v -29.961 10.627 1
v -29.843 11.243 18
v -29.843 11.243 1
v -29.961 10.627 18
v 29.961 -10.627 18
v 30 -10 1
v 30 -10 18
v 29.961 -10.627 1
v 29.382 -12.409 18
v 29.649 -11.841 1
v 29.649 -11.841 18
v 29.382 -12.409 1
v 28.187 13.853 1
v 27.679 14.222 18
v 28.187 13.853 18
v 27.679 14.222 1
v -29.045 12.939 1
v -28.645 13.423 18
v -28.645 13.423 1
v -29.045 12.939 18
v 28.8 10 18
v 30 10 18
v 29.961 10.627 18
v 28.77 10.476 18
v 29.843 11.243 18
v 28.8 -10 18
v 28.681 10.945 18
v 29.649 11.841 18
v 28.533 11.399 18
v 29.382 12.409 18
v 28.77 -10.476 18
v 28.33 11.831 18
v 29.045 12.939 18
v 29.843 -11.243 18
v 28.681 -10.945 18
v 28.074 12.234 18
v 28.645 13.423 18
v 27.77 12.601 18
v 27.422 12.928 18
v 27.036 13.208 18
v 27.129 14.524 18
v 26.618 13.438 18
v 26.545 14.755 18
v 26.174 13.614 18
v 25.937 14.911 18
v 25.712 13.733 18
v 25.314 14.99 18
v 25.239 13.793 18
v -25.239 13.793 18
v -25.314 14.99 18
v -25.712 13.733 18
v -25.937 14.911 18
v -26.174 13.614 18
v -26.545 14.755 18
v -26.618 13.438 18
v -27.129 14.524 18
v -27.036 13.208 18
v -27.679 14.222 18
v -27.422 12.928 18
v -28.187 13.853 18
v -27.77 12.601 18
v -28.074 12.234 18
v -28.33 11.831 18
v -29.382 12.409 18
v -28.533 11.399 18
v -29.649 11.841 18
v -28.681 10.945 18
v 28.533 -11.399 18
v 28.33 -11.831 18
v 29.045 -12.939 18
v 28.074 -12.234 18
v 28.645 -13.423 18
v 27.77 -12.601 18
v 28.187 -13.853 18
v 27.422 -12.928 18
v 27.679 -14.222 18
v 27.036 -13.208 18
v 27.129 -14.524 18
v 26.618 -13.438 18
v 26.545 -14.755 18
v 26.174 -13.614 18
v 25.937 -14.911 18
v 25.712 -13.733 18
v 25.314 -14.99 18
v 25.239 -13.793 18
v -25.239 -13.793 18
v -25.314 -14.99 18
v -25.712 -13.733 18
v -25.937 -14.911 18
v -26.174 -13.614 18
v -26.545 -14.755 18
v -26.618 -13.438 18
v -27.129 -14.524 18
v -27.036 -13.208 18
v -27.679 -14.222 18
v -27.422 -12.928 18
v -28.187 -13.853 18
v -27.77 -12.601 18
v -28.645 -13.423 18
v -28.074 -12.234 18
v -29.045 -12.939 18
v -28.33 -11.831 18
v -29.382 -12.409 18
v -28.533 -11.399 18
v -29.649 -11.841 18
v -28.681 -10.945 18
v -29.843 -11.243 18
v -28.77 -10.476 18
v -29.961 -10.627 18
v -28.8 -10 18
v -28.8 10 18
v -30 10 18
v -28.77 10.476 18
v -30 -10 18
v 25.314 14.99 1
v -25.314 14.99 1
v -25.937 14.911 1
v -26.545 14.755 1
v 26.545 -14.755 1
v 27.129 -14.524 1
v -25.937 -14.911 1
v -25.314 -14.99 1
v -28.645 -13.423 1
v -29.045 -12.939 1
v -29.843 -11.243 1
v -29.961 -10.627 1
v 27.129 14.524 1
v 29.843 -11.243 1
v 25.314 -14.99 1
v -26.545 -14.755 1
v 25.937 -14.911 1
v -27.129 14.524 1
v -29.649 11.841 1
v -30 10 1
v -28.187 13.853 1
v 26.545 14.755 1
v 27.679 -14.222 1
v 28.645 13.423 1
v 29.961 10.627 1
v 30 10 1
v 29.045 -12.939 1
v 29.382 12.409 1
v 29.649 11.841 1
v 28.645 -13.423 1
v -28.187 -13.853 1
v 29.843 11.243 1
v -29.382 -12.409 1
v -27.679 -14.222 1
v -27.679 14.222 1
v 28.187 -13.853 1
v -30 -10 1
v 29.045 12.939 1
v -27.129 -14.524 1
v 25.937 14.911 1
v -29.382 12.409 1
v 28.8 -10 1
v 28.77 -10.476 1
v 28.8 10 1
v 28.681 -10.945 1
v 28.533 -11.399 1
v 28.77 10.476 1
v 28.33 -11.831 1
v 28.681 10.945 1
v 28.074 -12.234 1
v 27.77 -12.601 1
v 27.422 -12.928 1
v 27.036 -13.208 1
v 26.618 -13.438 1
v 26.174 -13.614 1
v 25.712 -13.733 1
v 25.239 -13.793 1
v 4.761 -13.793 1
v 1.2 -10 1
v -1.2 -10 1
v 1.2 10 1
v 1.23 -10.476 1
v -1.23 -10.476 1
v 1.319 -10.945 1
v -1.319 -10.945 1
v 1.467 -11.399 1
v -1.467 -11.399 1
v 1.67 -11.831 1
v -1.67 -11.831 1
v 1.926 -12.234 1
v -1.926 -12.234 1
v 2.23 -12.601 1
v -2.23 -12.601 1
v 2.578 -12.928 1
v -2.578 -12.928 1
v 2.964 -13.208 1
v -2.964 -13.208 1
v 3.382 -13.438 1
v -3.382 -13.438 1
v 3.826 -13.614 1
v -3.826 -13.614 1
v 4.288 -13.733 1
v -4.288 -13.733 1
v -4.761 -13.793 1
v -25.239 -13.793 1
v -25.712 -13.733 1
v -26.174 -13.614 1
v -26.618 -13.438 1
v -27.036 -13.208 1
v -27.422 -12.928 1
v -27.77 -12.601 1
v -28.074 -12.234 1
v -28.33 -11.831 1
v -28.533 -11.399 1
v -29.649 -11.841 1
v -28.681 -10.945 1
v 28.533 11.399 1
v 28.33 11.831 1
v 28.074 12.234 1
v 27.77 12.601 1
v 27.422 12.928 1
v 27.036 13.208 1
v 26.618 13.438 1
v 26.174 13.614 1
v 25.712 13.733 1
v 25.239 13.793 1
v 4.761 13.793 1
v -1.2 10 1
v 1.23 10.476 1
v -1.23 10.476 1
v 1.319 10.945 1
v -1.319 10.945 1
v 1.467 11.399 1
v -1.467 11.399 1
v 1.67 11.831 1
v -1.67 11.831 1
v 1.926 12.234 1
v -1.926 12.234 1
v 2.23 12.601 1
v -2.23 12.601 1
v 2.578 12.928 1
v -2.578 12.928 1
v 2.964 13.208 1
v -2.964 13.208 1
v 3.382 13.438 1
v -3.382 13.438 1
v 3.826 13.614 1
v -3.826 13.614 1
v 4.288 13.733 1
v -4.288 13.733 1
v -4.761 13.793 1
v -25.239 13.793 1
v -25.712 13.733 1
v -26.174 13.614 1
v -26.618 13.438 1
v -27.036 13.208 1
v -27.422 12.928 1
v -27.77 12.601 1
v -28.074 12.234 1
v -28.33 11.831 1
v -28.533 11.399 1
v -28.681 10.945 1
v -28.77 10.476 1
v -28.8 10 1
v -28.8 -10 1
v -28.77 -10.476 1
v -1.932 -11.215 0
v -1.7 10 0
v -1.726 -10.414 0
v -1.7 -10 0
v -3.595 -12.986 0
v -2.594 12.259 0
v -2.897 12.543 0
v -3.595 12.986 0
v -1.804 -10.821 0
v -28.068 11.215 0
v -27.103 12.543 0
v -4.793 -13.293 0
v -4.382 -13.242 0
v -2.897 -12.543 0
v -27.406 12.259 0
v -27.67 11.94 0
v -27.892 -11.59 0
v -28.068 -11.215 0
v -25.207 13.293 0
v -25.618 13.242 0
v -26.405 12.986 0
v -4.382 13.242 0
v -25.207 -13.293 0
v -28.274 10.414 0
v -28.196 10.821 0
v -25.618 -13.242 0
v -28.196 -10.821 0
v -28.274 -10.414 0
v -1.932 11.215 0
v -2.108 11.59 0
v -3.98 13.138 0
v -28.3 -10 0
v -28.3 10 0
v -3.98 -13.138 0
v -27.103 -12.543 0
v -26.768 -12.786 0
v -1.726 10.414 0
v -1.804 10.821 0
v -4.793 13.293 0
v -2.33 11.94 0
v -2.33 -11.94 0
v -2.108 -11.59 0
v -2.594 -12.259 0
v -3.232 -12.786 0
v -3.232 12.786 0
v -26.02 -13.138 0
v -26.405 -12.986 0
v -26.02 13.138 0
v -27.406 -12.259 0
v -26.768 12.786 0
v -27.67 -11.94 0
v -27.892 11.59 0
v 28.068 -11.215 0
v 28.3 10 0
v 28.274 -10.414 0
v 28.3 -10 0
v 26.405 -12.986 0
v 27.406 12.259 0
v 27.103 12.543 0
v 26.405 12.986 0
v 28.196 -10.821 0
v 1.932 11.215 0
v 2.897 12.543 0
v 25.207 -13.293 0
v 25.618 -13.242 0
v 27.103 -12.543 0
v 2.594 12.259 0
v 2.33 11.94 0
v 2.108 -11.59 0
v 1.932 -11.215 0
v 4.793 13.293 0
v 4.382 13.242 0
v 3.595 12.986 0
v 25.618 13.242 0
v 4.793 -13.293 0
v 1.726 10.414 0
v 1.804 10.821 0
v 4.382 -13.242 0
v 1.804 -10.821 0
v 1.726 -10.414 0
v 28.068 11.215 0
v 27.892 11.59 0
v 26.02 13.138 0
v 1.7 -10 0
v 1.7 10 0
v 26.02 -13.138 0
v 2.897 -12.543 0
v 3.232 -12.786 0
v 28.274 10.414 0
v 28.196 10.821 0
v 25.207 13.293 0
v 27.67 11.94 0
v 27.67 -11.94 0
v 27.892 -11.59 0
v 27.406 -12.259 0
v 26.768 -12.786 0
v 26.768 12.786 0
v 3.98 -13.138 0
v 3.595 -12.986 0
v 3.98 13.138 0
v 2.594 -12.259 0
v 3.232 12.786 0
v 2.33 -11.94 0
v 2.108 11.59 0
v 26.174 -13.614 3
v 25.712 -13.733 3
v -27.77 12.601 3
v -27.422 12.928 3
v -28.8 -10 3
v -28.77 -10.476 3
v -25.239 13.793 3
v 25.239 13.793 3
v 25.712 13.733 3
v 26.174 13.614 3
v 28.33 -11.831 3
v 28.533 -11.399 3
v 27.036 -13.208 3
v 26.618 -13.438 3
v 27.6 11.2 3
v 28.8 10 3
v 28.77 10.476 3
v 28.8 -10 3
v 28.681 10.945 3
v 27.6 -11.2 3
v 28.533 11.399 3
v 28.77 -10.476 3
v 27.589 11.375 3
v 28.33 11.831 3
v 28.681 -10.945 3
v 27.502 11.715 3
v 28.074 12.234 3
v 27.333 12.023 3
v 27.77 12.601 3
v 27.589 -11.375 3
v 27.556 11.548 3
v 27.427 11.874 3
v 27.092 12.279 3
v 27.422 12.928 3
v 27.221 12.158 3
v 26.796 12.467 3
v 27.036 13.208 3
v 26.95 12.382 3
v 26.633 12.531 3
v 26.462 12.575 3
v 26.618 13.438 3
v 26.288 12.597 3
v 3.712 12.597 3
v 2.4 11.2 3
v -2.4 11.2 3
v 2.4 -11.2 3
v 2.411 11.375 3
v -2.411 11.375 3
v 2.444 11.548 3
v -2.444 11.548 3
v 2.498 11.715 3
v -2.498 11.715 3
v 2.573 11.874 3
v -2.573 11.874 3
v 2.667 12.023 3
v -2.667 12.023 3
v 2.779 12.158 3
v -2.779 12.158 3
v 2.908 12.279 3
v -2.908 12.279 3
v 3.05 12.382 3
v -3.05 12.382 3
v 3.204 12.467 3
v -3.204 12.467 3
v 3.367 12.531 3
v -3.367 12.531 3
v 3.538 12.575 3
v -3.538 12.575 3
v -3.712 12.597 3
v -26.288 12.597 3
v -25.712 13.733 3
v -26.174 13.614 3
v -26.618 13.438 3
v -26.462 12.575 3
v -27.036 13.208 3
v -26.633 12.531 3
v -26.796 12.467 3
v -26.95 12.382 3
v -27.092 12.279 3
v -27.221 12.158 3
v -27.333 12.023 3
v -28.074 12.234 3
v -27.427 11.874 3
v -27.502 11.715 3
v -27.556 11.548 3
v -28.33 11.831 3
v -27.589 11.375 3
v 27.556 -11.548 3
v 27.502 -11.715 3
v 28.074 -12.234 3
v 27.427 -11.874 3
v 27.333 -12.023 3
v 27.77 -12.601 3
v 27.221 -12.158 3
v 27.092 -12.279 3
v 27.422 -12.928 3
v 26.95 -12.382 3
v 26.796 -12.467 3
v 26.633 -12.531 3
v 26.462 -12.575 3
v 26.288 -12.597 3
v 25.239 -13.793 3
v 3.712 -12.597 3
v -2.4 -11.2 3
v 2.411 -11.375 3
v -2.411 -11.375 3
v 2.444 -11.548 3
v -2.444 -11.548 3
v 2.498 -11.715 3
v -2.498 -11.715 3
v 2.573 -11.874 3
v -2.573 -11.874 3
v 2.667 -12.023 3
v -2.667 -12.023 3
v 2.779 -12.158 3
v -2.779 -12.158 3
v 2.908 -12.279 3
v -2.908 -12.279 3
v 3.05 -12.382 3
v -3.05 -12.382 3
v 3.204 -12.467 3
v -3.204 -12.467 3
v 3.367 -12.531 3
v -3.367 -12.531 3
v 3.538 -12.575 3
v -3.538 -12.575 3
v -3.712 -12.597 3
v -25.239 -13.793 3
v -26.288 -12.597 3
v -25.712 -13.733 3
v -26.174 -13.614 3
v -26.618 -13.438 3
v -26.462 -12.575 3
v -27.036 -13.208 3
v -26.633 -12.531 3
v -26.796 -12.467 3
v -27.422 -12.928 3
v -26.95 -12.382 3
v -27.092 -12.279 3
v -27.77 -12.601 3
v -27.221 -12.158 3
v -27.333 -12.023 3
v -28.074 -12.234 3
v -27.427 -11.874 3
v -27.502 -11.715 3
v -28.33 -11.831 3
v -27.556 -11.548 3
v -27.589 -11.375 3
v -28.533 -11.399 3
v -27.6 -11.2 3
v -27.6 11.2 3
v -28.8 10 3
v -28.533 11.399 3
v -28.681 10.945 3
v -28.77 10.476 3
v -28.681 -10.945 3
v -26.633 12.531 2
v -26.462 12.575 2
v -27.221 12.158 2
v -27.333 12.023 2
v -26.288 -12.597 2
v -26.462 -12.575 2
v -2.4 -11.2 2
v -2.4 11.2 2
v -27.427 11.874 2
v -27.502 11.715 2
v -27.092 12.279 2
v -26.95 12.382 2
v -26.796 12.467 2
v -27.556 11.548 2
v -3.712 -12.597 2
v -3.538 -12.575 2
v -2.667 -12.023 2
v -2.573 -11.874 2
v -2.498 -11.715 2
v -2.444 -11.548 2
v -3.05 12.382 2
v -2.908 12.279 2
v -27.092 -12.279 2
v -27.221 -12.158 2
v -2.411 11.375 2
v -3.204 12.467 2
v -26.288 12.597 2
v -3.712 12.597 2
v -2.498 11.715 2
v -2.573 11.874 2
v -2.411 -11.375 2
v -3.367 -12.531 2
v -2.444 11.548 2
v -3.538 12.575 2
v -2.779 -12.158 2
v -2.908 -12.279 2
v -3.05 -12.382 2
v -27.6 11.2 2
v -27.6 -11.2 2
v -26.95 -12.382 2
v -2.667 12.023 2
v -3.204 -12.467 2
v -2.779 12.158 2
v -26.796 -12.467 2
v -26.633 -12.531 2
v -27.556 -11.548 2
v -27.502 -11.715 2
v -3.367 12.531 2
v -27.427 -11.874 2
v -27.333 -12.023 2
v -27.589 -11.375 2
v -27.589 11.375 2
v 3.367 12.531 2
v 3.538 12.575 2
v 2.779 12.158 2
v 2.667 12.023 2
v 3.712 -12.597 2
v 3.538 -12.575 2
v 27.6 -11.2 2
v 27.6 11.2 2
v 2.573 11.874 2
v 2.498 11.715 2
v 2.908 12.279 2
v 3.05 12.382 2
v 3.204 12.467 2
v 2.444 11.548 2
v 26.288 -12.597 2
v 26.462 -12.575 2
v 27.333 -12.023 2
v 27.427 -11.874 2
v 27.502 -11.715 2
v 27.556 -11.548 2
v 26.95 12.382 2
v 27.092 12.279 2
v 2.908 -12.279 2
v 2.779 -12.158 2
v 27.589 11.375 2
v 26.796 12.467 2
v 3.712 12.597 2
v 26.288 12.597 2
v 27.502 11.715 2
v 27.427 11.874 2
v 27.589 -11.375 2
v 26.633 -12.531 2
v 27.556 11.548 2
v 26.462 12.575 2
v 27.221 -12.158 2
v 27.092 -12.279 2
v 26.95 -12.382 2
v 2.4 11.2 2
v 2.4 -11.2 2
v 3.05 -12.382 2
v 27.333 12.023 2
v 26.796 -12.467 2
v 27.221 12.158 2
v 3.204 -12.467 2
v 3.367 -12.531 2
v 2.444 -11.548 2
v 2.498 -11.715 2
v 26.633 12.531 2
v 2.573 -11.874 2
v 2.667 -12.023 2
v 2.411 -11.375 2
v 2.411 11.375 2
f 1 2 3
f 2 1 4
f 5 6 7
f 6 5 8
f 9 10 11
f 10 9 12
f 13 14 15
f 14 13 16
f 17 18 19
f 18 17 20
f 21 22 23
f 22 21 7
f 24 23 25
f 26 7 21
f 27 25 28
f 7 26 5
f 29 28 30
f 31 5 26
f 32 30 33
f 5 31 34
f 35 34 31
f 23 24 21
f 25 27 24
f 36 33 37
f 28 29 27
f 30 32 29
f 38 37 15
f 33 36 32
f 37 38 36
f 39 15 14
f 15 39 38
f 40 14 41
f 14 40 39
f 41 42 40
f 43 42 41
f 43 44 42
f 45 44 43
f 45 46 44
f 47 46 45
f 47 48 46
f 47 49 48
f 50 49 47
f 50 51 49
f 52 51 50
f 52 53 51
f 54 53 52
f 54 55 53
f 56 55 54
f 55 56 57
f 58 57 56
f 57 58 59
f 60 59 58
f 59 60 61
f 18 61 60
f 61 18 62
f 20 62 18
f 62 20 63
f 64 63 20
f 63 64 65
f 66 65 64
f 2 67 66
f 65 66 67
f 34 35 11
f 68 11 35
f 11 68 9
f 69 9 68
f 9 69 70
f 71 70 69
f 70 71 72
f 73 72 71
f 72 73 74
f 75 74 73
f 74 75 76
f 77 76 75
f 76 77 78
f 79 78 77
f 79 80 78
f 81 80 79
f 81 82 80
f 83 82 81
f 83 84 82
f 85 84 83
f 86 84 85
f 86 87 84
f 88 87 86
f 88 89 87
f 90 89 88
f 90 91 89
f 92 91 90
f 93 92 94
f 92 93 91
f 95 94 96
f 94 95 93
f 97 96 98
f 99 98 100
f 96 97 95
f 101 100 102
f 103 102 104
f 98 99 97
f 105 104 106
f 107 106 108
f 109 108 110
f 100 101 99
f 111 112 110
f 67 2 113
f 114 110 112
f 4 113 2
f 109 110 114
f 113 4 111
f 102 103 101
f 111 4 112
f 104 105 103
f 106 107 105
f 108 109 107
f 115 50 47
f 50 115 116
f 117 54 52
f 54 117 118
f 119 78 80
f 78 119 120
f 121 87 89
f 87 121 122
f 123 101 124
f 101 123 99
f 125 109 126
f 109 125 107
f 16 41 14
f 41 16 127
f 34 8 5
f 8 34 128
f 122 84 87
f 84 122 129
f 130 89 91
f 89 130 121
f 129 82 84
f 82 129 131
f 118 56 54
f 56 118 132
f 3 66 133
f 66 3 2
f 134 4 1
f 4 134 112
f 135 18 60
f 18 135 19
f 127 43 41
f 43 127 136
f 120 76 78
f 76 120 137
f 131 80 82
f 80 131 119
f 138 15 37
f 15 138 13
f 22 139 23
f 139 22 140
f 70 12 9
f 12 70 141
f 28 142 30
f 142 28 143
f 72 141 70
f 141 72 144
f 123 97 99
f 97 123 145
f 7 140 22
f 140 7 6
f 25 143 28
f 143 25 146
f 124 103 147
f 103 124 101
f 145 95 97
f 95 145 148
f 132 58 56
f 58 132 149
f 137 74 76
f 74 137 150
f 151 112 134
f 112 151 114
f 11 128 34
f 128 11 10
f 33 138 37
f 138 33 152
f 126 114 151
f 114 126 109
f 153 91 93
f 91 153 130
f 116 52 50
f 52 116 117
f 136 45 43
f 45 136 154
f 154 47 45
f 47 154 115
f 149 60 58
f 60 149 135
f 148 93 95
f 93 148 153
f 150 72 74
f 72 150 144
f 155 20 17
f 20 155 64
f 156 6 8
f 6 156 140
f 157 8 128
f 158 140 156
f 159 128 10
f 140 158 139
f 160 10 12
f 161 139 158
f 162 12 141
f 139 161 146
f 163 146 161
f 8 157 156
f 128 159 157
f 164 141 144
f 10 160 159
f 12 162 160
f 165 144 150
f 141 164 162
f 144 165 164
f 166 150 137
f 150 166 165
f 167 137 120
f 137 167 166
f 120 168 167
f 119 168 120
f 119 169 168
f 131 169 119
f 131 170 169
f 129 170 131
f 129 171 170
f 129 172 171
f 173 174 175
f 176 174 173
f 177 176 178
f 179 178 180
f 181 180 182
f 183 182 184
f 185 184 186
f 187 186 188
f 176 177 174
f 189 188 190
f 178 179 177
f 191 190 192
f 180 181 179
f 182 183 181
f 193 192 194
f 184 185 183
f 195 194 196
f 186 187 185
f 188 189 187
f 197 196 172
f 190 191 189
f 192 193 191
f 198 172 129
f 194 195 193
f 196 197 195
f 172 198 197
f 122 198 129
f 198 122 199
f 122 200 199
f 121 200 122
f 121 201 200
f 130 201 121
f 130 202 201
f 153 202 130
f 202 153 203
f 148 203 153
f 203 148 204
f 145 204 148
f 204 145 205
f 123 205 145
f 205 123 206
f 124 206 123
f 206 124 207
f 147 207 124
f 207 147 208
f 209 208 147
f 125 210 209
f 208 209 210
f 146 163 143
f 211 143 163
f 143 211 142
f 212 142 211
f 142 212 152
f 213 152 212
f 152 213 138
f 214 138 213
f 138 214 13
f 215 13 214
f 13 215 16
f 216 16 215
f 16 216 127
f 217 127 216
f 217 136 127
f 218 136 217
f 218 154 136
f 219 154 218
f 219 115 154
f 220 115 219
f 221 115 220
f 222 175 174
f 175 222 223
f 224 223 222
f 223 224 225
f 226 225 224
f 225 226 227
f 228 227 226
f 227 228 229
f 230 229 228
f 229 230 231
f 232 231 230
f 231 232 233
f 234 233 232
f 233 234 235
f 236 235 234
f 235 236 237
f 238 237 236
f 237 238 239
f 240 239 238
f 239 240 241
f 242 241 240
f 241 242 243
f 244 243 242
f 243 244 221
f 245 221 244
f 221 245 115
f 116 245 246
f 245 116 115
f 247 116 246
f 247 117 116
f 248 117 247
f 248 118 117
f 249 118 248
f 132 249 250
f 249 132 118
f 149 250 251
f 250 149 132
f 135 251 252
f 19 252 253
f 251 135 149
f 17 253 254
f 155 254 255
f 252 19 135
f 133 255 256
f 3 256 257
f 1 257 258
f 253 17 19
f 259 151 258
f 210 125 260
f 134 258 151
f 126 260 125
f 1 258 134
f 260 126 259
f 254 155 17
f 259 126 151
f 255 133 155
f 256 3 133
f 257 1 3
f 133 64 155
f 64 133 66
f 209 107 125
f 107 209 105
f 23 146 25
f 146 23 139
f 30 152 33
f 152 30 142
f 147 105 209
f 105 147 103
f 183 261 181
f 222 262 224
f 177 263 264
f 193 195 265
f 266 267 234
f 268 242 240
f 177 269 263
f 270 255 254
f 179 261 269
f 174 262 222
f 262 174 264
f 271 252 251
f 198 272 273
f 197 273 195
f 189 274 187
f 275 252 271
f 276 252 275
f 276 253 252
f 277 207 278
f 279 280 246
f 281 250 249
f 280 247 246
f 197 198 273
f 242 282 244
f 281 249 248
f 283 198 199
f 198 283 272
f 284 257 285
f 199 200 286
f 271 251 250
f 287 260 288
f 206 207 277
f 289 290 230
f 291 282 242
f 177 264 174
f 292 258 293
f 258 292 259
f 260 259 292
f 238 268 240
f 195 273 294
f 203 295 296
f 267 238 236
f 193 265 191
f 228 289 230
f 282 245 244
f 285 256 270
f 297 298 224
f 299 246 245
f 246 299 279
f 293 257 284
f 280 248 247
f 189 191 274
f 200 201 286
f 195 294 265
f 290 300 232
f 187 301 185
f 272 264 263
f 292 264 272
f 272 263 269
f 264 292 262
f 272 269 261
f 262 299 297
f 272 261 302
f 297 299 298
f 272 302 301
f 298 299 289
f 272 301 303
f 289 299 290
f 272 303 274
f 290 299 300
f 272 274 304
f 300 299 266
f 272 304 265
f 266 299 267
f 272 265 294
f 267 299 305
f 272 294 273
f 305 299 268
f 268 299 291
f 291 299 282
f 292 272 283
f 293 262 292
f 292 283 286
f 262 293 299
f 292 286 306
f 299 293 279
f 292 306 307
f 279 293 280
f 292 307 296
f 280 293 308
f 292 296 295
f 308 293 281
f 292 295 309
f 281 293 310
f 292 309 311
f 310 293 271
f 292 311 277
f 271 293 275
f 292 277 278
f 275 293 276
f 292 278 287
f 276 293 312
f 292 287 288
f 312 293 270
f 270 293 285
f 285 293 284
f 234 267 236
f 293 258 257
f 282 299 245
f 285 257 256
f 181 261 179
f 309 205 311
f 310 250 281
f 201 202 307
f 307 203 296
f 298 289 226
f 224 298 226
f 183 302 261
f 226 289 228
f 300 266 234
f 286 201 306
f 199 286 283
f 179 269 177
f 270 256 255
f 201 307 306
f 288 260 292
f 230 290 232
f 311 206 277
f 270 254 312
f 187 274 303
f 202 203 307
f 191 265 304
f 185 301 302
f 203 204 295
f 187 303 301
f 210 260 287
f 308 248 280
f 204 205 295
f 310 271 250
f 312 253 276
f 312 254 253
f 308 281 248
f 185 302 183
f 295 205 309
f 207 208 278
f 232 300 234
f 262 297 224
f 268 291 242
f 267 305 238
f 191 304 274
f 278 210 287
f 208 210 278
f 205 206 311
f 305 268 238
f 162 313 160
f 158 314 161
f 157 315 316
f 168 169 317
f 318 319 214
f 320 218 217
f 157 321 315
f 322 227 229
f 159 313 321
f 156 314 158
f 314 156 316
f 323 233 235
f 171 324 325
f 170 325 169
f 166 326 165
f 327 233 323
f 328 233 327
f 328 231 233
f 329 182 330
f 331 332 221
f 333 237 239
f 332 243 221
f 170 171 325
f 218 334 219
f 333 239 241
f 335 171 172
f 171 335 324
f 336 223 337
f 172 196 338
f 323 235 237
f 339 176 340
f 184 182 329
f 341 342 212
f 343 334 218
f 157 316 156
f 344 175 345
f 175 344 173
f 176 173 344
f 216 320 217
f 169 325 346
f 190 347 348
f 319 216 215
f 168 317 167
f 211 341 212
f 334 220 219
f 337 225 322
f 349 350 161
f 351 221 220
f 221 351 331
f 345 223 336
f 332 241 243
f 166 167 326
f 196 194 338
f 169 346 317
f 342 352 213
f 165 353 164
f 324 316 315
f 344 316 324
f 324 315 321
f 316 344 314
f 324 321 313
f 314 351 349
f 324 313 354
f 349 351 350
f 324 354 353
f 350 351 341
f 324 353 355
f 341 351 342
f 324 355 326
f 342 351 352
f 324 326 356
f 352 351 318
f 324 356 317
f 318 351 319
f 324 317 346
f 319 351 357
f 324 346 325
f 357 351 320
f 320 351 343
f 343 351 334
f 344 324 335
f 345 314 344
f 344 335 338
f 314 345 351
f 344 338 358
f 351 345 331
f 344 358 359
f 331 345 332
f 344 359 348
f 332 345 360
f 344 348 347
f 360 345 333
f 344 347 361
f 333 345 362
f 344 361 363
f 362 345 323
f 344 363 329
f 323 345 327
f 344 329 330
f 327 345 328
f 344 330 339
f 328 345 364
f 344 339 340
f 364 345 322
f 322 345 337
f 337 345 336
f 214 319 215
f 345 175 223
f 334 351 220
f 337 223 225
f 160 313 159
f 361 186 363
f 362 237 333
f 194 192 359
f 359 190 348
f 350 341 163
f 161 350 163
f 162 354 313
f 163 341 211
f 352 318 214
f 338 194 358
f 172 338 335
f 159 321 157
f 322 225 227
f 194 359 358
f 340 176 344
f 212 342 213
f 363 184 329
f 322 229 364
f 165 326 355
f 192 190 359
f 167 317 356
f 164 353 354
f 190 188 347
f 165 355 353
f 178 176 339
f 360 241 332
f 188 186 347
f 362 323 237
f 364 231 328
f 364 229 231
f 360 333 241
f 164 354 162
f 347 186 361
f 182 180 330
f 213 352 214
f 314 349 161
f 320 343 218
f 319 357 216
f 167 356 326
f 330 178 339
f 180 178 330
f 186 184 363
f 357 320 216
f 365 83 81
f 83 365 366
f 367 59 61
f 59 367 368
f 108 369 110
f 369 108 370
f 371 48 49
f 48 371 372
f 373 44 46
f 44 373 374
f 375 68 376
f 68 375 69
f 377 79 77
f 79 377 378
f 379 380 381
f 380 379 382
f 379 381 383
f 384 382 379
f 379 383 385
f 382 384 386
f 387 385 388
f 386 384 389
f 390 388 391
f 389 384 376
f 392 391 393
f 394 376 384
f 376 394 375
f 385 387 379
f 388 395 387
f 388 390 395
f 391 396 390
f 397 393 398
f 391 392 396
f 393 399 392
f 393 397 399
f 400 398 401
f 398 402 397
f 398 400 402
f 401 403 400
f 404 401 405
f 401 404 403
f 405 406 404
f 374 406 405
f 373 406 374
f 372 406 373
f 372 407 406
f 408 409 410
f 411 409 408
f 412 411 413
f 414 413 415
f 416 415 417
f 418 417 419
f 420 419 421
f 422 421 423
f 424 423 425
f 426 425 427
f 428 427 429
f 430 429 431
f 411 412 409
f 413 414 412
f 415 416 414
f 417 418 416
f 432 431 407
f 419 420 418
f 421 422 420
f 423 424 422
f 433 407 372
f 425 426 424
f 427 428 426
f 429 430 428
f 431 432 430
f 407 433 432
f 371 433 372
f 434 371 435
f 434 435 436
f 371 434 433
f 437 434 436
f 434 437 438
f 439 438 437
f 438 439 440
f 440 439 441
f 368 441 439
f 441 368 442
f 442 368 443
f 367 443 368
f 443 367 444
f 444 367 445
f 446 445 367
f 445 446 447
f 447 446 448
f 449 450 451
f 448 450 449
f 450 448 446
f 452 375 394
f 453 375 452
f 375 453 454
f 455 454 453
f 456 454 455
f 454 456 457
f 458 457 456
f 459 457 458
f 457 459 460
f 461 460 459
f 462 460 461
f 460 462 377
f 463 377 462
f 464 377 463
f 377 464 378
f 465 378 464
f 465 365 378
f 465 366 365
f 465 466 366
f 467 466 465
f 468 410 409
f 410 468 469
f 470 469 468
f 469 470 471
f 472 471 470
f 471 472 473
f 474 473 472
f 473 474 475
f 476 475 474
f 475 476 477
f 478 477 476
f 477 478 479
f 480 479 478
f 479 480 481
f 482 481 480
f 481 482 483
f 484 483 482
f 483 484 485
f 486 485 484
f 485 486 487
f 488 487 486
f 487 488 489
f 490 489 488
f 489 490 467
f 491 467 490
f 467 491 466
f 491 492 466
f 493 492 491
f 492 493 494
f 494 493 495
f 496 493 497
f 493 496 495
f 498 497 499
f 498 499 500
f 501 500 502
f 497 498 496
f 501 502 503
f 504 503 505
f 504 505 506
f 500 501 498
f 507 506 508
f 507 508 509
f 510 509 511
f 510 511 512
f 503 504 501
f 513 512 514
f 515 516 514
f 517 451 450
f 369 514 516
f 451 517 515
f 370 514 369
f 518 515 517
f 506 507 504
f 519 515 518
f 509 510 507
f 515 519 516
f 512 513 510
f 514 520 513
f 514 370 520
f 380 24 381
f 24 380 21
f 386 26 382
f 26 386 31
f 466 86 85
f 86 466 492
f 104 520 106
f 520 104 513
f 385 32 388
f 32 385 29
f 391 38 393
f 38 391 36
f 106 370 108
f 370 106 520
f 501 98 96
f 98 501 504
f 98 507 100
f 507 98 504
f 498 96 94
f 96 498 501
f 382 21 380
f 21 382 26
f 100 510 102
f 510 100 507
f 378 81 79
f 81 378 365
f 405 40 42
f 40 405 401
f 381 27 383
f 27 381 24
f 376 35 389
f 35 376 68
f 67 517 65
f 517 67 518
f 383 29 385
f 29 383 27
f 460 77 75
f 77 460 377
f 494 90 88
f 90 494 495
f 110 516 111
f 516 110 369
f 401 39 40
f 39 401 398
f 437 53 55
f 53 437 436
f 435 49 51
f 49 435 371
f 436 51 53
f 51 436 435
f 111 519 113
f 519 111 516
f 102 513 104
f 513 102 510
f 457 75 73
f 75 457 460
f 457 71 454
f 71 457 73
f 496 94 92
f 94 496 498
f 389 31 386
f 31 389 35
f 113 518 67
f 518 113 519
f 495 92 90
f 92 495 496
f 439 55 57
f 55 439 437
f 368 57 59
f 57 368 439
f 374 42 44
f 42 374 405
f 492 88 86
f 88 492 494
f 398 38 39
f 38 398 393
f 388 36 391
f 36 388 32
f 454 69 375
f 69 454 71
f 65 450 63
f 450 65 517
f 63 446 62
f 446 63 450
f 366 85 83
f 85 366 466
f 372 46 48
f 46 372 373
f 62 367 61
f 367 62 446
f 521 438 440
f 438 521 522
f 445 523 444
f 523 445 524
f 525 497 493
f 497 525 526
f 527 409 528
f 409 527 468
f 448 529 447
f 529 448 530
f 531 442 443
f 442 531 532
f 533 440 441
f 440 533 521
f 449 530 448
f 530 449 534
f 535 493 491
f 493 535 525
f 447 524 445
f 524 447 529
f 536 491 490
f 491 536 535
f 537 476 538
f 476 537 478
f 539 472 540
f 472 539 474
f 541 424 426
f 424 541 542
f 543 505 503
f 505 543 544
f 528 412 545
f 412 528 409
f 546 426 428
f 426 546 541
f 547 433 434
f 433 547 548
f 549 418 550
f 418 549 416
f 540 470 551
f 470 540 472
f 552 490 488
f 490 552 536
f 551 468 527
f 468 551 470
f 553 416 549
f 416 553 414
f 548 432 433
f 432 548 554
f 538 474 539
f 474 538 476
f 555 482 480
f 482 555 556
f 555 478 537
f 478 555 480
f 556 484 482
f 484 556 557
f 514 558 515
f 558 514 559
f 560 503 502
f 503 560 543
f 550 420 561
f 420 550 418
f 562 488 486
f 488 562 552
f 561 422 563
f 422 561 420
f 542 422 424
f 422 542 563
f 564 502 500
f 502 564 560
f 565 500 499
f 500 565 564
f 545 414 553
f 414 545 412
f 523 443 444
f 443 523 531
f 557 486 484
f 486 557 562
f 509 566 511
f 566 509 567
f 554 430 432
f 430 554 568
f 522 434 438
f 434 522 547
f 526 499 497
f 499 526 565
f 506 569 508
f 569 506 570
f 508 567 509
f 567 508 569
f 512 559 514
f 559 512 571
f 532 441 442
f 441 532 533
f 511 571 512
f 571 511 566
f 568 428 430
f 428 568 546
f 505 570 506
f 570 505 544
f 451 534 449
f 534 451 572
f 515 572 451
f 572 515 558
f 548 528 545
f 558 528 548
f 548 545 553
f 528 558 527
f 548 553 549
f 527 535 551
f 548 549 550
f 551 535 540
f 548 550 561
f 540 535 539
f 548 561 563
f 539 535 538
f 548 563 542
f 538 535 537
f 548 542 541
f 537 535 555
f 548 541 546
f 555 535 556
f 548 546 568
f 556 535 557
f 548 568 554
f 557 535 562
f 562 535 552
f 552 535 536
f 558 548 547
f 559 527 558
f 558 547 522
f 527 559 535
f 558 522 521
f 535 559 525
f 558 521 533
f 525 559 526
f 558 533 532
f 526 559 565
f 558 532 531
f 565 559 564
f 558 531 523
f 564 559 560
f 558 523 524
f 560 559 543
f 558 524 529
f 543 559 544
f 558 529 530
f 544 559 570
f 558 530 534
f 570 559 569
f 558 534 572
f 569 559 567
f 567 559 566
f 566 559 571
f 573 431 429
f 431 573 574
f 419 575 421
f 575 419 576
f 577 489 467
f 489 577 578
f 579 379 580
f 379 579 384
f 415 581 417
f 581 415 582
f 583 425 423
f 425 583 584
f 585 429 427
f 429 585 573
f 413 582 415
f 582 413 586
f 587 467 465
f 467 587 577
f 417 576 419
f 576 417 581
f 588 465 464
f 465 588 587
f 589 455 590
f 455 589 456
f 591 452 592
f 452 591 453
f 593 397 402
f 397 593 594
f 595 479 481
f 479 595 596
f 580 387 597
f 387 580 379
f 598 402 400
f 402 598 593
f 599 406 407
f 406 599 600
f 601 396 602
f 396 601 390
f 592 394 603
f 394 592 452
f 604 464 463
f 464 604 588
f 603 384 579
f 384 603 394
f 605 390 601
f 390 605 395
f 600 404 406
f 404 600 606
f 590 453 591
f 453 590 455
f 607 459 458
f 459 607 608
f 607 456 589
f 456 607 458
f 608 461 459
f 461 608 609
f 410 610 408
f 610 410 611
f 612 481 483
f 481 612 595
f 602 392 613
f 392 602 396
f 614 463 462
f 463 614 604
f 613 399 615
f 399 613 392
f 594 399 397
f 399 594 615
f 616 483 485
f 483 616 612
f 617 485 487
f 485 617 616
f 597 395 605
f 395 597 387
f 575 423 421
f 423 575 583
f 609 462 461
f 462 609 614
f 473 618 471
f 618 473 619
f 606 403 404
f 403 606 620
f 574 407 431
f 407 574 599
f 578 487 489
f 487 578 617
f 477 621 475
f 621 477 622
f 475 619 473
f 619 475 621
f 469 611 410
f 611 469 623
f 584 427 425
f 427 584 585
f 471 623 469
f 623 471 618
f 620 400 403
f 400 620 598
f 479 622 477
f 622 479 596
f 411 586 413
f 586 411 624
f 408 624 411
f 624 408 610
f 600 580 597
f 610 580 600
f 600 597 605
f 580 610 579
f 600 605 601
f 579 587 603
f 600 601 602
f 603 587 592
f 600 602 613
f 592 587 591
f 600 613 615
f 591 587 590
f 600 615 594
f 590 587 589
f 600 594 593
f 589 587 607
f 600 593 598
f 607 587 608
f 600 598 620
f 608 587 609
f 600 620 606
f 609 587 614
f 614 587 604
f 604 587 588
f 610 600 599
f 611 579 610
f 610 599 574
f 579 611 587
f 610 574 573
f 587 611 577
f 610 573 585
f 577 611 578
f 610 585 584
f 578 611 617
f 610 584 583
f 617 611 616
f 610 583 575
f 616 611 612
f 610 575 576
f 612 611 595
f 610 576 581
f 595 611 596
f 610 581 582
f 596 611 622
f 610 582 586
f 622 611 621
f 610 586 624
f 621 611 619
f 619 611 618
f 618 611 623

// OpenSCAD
$fn = 50;


difference() {
	union() {
		translate(v = [0, 0, 1]) {
			hull() {
				translate(v = [-25.0000000000, 10.0000000000, 0]) {
					cylinder(h = 17, r = 5);
				}
				translate(v = [25.0000000000, 10.0000000000, 0]) {
					cylinder(h = 17, r = 5);
				}
				translate(v = [-25.0000000000, -10.0000000000, 0]) {
					cylinder(h = 17, r = 5);
				}
				translate(v = [25.0000000000, -10.0000000000, 0]) {
					cylinder(h = 17, r = 5);
				}
			}
		}
		translate(v = [-15.0000000000, 0, 1]) {
			rotate(a = [0, 180, 0]) {
				hull() {
					translate(v = [-10.0000000000, 10.0000000000, 0]) {
						cylinder(h = 1, r1 = 3.8000000000, r2 = 3.3000000000);
					}
					translate(v = [10.0000000000, 10.0000000000, 0]) {
						cylinder(h = 1, r1 = 3.8000000000, r2 = 3.3000000000);
					}
					translate(v = [-10.0000000000, -10.0000000000, 0]) {
						cylinder(h = 1, r1 = 3.8000000000, r2 = 3.3000000000);
					}
					translate(v = [10.0000000000, -10.0000000000, 0]) {
						cylinder(h = 1, r1 = 3.8000000000, r2 = 3.3000000000);
					}
				}
			}
		}
		translate(v = [15.0000000000, 0, 1]) {
			rotate(a = [0, 180, 0]) {
				hull() {
					translate(v = [-10.0000000000, 10.0000000000, 0]) {
						cylinder(h = 1, r1 = 3.8000000000, r2 = 3.3000000000);
					}
					translate(v = [10.0000000000, 10.0000000000, 0]) {
						cylinder(h = 1, r1 = 3.8000000000, r2 = 3.3000000000);
					}
					translate(v = [-10.0000000000, -10.0000000000, 0]) {
						cylinder(h = 1, r1 = 3.8000000000, r2 = 3.3000000000);
					}
					translate(v = [10.0000000000, -10.0000000000, 0]) {
						cylinder(h = 1, r1 = 3.8000000000, r2 = 3.3000000000);
					}
				}
			}
		}
		translate(v = [-15.0000000000, 0, 3]) {
			rotate(a = [0, 180, 0]) {
				hull() {
					translate(v = [-10.0000000000, 10.0000000000, 0]) {
						cylinder(h = 2, r1 = 3.8000000000, r2 = 3.8000000000);
					}
					translate(v = [10.0000000000, 10.0000000000, 0]) {
						cylinder(h = 2, r1 = 3.8000000000, r2 = 3.8000000000);
					}
					translate(v = [-10.0000000000, -10.0000000000, 0]) {
						cylinder(h = 2, r1 = 3.8000000000, r2 = 3.8000000000);
					}
					translate(v = [10.0000000000, -10.0000000000, 0]) {
						cylinder(h = 2, r1 = 3.8000000000, r2 = 3.8000000000);
					}
				}
			}
		}
		translate(v = [15.0000000000, 0, 3]) {
			rotate(a = [0, 180, 0]) {
				hull() {
					translate(v = [-10.0000000000, 10.0000000000, 0]) {
						cylinder(h = 2, r1 = 3.8000000000, r2 = 3.8000000000);
					}
					translate(v = [10.0000000000, 10.0000000000, 0]) {
						cylinder(h = 2, r1 = 3.8000000000, r2 = 3.8000000000);
					}
					translate(v = [-10.0000000000, -10.0000000000, 0]) {
						cylinder(h = 2, r1 = 3.8000000000, r2 = 3.8000000000);
					}
					translate(v = [10.0000000000, -10.0000000000, 0]) {
						cylinder(h = 2, r1 = 3.8000000000, r2 = 3.8000000000);
					}
				}
			}
		}
	}
	union() {
		translate(v = [0, 0, 3]) {
			hull() {
				translate(v = [-25.0000000000, 10.0000000000, 0]) {
					cylinder(h = 15, r = 3.8000000000);
				}
				translate(v = [25.0000000000, 10.0000000000, 0]) {
					cylinder(h = 15, r = 3.8000000000);
				}
				translate(v = [-25.0000000000, -10.0000000000, 0]) {
					cylinder(h = 15, r = 3.8000000000);
				}
				translate(v = [25.0000000000, -10.0000000000, 0]) {
					cylinder(h = 15, r = 3.8000000000);
				}
			}
		}
		translate(v = [-15.0000000000, 0, 5]) {
			rotate(a = [0, 180, 0]) {
				#hull() {
					translate(v = [-11.2000000000, 11.2000000000, 0]) {
						cylinder(h = 3, r1 = 1.4000000000, r2 = 1.4000000000);
					}
					translate(v = [11.2000000000, 11.2000000000, 0]) {
						cylinder(h = 3, r1 = 1.4000000000, r2 = 1.4000000000);
					}
					translate(v = [-11.2000000000, -11.2000000000, 0]) {
						cylinder(h = 3, r1 = 1.4000000000, r2 = 1.4000000000);
					}
					translate(v = [11.2000000000, -11.2000000000, 0]) {
						cylinder(h = 3, r1 = 1.4000000000, r2 = 1.4000000000);
					}
				}
			}
		}
		translate(v = [15.0000000000, 0, 5]) {
			rotate(a = [0, 180, 0]) {
				#hull() {
					translate(v = [-11.2000000000, 11.2000000000, 0]) {
						cylinder(h = 3, r1 = 1.4000000000, r2 = 1.4000000000);
					}
					translate(v = [11.2000000000, 11.2000000000, 0]) {
						cylinder(h = 3, r1 = 1.4000000000, r2 = 1.4000000000);
					}
					translate(v = [-11.2000000000, -11.2000000000, 0]) {
						cylinder(h = 3, r1 = 1.4000000000, r2 = 1.4000000000);
					}
					translate(v = [11.2000000000, -11.2000000000, 0]) {
						cylinder(h = 3, r1 = 1.4000000000, r2 = 1.4000000000);
					}
				}
			}
		}
	}
}
